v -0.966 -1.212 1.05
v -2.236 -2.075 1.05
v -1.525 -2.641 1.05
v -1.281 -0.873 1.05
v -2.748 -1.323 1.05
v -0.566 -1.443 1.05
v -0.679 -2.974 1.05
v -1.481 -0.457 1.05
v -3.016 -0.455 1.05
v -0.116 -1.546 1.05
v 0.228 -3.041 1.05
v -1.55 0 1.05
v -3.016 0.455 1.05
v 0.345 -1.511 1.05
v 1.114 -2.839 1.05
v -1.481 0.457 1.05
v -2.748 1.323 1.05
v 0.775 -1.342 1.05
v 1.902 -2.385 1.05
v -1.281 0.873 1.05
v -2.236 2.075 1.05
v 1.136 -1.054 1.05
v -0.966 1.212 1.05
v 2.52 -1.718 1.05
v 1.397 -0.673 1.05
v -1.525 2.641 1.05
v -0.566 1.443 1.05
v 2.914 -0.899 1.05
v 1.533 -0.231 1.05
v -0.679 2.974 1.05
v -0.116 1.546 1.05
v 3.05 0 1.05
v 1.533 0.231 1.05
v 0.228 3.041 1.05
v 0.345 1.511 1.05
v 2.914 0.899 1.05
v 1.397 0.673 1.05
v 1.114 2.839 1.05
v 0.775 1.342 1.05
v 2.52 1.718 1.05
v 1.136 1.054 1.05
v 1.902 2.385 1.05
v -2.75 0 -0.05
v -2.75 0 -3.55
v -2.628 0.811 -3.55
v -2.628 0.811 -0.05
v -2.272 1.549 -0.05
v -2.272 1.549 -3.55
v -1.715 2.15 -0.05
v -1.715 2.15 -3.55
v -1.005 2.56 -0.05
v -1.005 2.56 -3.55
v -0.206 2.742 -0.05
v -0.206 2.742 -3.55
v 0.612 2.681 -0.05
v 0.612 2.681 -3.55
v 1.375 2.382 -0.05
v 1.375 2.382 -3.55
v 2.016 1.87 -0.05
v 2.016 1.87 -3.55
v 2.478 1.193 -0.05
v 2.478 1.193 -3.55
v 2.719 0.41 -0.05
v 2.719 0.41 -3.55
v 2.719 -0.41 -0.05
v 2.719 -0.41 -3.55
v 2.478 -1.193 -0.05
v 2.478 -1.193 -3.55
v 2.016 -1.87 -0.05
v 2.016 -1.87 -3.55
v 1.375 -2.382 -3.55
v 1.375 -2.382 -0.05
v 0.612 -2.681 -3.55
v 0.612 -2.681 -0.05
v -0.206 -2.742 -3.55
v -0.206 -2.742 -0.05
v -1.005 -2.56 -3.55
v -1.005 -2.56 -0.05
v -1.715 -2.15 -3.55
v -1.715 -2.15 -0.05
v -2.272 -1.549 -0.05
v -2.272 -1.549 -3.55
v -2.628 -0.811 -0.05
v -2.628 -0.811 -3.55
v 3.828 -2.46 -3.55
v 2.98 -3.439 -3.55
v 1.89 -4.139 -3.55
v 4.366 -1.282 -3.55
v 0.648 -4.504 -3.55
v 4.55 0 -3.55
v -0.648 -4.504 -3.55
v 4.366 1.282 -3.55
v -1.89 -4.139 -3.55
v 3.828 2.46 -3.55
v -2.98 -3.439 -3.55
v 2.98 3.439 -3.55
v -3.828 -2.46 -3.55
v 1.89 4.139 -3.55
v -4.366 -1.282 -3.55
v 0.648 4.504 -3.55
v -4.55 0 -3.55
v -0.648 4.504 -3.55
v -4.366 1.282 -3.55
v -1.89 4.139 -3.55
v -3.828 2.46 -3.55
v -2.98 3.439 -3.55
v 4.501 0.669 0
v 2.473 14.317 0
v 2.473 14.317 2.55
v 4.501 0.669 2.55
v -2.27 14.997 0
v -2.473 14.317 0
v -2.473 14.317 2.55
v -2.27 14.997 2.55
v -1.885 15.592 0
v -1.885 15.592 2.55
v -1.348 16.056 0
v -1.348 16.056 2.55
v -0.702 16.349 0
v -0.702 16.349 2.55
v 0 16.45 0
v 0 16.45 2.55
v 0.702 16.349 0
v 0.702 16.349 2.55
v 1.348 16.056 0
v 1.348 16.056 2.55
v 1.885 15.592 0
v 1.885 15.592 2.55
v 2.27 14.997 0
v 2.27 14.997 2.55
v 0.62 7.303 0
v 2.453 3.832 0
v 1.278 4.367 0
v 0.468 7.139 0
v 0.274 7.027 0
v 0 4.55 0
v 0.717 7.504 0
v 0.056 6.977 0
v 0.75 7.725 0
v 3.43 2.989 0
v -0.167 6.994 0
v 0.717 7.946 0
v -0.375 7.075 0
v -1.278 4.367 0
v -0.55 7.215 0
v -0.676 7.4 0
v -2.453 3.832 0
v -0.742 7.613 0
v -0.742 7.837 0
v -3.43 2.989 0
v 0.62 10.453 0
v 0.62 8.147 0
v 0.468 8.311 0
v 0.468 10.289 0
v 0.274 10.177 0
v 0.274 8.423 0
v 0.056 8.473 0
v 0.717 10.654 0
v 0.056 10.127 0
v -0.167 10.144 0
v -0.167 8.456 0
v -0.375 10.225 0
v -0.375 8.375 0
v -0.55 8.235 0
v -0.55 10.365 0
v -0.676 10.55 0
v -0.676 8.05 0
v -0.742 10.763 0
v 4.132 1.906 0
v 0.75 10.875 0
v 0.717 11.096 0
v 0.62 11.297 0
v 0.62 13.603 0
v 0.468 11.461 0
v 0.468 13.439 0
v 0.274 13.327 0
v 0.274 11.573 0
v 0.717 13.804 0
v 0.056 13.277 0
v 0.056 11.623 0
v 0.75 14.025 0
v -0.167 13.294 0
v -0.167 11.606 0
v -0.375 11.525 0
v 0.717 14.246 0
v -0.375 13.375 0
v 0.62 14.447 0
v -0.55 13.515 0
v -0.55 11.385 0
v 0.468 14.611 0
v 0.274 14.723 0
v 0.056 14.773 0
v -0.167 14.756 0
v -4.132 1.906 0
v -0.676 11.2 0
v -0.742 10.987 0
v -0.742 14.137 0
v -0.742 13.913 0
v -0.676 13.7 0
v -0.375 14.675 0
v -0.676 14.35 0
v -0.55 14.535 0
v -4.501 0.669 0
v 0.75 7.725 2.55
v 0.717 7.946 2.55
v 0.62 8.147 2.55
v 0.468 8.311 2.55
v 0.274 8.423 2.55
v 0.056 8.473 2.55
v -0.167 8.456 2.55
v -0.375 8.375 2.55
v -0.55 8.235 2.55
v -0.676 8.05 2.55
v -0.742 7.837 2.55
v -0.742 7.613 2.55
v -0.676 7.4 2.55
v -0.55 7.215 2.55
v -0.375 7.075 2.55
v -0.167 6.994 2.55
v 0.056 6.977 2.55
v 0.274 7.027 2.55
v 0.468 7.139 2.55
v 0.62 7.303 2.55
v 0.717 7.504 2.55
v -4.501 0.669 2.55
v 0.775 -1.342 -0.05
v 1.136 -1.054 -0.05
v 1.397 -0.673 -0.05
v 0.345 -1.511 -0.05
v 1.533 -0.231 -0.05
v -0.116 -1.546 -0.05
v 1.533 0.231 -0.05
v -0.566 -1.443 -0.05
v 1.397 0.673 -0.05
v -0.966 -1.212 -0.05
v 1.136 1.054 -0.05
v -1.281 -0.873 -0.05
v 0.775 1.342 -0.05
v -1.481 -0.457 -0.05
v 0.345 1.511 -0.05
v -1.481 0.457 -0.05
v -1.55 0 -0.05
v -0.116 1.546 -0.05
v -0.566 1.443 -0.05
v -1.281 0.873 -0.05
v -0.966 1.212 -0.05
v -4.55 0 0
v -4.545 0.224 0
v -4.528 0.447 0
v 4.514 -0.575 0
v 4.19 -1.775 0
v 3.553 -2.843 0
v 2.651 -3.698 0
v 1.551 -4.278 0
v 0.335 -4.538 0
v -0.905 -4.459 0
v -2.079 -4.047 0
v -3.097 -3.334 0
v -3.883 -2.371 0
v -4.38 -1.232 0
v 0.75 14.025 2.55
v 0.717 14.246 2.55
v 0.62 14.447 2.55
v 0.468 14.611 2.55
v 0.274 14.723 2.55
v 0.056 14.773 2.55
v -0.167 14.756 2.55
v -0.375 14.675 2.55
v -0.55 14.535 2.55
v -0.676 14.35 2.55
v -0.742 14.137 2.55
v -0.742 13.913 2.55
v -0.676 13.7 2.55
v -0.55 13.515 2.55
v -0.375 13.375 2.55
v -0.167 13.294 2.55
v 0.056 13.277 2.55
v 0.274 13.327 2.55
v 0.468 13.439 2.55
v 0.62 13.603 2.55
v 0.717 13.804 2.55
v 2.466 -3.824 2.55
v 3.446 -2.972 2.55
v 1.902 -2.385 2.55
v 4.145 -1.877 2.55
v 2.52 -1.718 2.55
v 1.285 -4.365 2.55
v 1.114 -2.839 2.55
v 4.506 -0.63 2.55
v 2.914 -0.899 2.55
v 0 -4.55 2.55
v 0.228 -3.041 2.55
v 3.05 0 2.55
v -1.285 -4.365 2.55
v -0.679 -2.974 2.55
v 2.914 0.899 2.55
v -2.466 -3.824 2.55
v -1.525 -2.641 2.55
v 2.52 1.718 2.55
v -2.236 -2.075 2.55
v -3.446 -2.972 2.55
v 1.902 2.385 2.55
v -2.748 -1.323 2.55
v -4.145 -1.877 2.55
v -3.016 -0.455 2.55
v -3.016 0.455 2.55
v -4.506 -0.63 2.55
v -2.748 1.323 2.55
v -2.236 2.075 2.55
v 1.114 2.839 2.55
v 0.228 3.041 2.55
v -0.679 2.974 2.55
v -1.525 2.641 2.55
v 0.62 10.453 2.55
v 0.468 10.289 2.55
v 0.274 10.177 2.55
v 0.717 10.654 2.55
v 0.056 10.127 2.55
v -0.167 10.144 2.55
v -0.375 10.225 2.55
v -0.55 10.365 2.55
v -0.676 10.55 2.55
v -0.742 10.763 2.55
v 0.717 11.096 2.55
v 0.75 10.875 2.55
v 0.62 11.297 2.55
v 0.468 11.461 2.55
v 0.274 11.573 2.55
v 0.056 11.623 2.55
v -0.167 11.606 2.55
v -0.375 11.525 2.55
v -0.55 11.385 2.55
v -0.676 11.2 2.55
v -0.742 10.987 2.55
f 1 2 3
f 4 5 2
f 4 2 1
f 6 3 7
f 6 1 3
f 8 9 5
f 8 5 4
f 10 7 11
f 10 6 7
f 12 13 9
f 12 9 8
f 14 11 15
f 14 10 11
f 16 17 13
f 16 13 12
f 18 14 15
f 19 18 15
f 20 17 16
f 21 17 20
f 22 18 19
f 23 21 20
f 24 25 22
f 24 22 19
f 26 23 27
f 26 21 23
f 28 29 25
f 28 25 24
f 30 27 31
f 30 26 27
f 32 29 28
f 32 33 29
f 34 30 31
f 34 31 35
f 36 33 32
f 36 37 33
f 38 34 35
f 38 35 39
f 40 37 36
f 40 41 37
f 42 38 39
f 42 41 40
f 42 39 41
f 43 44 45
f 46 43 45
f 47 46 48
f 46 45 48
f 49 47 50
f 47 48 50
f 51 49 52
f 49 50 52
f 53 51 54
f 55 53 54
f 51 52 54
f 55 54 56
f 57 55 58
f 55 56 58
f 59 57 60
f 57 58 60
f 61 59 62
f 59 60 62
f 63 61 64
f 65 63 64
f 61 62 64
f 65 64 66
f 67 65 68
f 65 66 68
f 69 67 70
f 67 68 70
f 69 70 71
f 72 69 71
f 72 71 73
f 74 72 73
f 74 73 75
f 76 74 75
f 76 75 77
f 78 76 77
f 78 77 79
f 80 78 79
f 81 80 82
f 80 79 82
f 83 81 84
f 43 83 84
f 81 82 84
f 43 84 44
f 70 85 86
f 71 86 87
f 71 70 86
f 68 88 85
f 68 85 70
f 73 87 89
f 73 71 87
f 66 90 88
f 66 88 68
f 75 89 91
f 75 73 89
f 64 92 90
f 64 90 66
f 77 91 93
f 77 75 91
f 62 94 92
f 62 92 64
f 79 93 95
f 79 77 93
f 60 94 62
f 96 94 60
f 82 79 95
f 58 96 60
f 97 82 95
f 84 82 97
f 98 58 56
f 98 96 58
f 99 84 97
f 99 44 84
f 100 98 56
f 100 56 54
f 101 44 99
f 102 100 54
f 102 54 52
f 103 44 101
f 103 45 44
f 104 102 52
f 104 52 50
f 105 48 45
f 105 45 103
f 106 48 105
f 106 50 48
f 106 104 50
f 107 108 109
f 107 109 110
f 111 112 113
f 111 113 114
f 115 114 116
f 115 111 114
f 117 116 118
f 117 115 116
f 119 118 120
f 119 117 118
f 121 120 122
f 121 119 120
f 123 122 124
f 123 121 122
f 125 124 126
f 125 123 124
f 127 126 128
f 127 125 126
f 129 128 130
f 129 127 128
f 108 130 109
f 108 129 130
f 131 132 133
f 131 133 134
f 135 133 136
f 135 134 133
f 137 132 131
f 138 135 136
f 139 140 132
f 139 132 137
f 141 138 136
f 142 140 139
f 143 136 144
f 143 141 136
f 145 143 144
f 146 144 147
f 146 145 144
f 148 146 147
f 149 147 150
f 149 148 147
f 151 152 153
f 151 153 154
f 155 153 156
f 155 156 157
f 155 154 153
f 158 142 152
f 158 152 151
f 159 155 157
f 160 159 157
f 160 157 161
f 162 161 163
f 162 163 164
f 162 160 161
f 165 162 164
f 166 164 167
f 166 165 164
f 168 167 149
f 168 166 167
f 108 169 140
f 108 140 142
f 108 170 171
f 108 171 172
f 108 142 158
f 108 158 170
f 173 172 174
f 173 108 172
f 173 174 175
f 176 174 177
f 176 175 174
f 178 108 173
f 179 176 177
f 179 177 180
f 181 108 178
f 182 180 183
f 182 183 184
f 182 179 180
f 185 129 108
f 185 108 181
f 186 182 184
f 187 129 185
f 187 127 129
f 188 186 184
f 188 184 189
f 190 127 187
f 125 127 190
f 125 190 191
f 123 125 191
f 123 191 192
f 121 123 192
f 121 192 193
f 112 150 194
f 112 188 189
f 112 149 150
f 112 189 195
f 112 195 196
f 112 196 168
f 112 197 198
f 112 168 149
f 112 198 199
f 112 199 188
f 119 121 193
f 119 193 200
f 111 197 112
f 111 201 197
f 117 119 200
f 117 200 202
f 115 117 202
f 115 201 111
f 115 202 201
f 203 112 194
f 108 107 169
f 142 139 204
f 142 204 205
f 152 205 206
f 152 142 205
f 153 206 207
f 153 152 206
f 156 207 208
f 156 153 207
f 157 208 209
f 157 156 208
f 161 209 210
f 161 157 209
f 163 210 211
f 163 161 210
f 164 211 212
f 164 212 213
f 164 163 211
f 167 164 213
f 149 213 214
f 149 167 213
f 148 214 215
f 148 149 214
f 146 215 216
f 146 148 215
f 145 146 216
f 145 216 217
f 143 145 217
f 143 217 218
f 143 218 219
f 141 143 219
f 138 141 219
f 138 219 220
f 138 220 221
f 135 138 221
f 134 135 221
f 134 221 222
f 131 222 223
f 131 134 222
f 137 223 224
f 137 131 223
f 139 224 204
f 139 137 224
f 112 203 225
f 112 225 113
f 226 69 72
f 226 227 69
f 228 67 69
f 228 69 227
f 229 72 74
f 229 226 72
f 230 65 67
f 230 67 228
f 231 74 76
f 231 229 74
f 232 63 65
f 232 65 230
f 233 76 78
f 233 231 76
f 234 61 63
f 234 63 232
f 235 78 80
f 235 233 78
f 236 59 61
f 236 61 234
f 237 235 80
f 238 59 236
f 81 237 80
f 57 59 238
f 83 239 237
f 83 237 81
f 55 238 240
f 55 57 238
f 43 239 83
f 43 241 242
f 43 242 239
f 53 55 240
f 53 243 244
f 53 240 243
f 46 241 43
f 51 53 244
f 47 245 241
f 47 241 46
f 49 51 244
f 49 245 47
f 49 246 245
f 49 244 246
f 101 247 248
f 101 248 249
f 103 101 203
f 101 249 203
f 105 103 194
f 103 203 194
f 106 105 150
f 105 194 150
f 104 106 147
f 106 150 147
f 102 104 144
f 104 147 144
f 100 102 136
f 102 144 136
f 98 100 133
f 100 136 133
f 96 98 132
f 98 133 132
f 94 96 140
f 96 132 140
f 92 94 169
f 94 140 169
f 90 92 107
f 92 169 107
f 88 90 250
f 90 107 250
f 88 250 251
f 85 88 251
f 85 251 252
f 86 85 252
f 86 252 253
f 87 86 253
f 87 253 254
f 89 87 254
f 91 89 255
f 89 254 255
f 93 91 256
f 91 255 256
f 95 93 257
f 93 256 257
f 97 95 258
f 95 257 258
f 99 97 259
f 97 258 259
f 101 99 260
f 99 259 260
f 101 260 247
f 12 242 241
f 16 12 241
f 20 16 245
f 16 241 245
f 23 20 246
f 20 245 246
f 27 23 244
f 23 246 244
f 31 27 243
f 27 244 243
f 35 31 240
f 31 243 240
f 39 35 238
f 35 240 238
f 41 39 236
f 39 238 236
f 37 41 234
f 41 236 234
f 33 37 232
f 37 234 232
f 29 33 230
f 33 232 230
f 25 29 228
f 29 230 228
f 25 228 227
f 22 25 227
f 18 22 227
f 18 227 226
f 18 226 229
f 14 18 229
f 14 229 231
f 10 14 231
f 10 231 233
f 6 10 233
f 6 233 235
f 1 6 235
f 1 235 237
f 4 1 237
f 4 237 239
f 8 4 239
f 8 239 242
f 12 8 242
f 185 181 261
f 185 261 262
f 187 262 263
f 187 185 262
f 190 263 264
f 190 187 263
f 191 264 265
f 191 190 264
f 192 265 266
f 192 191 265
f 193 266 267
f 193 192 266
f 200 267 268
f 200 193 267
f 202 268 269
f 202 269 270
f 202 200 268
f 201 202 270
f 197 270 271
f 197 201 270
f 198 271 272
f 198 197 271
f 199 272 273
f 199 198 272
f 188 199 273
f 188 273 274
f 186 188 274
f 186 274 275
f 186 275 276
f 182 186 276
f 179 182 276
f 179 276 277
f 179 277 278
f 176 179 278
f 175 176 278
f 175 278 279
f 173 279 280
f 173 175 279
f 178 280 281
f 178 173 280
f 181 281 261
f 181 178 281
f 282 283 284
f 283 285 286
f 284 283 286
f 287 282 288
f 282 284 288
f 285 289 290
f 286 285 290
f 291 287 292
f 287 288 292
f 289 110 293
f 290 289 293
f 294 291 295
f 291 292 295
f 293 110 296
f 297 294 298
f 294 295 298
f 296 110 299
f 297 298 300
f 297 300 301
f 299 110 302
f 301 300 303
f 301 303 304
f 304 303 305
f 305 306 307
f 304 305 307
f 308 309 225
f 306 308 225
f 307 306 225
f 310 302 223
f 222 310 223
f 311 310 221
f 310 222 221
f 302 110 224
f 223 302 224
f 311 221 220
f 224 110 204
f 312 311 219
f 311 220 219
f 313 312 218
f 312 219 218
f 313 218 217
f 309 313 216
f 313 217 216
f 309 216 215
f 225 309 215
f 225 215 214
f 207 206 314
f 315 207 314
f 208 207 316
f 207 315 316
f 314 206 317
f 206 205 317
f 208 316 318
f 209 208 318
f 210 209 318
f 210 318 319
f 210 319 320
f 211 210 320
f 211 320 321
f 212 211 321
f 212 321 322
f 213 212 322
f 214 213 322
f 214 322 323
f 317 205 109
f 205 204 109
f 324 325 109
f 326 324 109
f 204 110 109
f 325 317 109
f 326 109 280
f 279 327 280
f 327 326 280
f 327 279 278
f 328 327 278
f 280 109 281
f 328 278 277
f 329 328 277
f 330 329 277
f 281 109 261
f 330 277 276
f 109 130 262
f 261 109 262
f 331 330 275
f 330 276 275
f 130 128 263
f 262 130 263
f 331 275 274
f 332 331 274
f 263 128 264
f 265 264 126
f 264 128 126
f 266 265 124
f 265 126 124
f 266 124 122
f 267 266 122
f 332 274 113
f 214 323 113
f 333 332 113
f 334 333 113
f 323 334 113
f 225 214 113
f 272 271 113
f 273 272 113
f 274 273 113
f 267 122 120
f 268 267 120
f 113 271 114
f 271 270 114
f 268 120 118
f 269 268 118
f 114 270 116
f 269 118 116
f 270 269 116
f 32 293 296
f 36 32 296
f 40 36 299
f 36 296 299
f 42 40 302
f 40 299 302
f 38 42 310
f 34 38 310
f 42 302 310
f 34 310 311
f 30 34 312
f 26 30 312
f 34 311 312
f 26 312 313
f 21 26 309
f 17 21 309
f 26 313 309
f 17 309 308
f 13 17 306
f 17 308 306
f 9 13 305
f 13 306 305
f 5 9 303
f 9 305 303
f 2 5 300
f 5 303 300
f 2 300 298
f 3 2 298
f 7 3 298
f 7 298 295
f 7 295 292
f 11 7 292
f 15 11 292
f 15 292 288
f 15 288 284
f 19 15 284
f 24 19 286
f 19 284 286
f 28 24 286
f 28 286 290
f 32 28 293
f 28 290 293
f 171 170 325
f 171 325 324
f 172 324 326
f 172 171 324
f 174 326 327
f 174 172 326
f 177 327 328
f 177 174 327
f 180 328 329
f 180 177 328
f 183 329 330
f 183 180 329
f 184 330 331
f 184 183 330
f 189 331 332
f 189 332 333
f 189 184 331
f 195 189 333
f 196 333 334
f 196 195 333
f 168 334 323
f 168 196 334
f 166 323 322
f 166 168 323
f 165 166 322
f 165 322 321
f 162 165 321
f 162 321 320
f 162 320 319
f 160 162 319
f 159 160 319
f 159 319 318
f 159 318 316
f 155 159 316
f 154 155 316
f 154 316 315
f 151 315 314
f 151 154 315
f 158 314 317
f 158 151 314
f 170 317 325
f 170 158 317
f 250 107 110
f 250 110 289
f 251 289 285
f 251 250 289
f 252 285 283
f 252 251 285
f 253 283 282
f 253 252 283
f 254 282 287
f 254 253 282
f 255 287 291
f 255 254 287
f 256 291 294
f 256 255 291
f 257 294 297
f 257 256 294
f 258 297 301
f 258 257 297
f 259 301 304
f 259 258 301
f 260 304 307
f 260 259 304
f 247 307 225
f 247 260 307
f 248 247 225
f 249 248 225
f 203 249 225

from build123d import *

# Parameters (mm, degrees)
ESQUISSE1_R                     = 0.75
BOSS_EXTRU_1_DEPTH              = 2.55
ESQUISSE2_R                     = 4.55
BOSS_EXTRU_2_DEPTH              = 3.55
ESQUISSE3_R                     = 3.05
ENL_V_MAT_EXTRU_1_DEPTH         = 1.5
DIAM_TRE_DU_PER_AGE_3_1_3_1_1_D = 3.1
ESQUISSE6_R                     = 2.75
ENL_V_MAT_EXTRU_2_DEPTH         = 3.5


with BuildPart() as part:
    # Esquisse1 → Boss.-Extru.1 (new body)
    with BuildSketch(Plane.XY):
        with BuildLine():
            Line((-4.500602541, 0.668637993), (-2.472858539, 14.317383513))
            ThreePointArc((-2.472858539, 14.317383513), (0, 16.45), (2.472858539, 14.317383513))
            Line((2.472858539, 14.317383513), (4.500602541, 0.668637993))
            ThreePointArc((4.500602541, 0.668637993), (0, -4.55), (-4.500602541, 0.668637993))
        make_face()
        with Locations((0, 7.725)):
            Circle(ESQUISSE1_R, mode=Mode.SUBTRACT)
        with Locations((0, 10.875)):
            Circle(ESQUISSE1_R, mode=Mode.SUBTRACT)
        with Locations((0, 14.025)):
            Circle(ESQUISSE1_R, mode=Mode.SUBTRACT)
    extrude(amount=BOSS_EXTRU_1_DEPTH)

    # Esquisse2 → Boss.-Extru.2 (add)
    with BuildSketch(Plane(origin=(0, 0, 0), x_dir=(-1, 0, 0), z_dir=(0, 0, -1))):
        Circle(ESQUISSE2_R)
    extrude(amount=BOSS_EXTRU_2_DEPTH)

    # Esquisse3 → Enlèv. mat.-Extru.1 (cut)
    with BuildSketch(Plane.XY.offset(2.55)):
        Circle(ESQUISSE3_R)
    extrude(amount=-ENL_V_MAT_EXTRU_1_DEPTH, mode=Mode.SUBTRACT)

    # Diamètre du perçage Ø3.1 (3.1)1 (through all)
    with Locations(Plane.XY.offset(1.05)):
        with Locations((0, 0)):
            Hole(DIAM_TRE_DU_PER_AGE_3_1_3_1_1_D / 2)

    # Esquisse6 → Enlèv. mat.-Extru.2 (cut)
    with BuildSketch(Plane(origin=(0, 0, -3.55), x_dir=(-1, 0, 0), z_dir=(0, 0, -1))):
        Circle(ESQUISSE6_R)
    extrude(amount=-ENL_V_MAT_EXTRU_2_DEPTH, mode=Mode.SUBTRACT)


solid = part.part
